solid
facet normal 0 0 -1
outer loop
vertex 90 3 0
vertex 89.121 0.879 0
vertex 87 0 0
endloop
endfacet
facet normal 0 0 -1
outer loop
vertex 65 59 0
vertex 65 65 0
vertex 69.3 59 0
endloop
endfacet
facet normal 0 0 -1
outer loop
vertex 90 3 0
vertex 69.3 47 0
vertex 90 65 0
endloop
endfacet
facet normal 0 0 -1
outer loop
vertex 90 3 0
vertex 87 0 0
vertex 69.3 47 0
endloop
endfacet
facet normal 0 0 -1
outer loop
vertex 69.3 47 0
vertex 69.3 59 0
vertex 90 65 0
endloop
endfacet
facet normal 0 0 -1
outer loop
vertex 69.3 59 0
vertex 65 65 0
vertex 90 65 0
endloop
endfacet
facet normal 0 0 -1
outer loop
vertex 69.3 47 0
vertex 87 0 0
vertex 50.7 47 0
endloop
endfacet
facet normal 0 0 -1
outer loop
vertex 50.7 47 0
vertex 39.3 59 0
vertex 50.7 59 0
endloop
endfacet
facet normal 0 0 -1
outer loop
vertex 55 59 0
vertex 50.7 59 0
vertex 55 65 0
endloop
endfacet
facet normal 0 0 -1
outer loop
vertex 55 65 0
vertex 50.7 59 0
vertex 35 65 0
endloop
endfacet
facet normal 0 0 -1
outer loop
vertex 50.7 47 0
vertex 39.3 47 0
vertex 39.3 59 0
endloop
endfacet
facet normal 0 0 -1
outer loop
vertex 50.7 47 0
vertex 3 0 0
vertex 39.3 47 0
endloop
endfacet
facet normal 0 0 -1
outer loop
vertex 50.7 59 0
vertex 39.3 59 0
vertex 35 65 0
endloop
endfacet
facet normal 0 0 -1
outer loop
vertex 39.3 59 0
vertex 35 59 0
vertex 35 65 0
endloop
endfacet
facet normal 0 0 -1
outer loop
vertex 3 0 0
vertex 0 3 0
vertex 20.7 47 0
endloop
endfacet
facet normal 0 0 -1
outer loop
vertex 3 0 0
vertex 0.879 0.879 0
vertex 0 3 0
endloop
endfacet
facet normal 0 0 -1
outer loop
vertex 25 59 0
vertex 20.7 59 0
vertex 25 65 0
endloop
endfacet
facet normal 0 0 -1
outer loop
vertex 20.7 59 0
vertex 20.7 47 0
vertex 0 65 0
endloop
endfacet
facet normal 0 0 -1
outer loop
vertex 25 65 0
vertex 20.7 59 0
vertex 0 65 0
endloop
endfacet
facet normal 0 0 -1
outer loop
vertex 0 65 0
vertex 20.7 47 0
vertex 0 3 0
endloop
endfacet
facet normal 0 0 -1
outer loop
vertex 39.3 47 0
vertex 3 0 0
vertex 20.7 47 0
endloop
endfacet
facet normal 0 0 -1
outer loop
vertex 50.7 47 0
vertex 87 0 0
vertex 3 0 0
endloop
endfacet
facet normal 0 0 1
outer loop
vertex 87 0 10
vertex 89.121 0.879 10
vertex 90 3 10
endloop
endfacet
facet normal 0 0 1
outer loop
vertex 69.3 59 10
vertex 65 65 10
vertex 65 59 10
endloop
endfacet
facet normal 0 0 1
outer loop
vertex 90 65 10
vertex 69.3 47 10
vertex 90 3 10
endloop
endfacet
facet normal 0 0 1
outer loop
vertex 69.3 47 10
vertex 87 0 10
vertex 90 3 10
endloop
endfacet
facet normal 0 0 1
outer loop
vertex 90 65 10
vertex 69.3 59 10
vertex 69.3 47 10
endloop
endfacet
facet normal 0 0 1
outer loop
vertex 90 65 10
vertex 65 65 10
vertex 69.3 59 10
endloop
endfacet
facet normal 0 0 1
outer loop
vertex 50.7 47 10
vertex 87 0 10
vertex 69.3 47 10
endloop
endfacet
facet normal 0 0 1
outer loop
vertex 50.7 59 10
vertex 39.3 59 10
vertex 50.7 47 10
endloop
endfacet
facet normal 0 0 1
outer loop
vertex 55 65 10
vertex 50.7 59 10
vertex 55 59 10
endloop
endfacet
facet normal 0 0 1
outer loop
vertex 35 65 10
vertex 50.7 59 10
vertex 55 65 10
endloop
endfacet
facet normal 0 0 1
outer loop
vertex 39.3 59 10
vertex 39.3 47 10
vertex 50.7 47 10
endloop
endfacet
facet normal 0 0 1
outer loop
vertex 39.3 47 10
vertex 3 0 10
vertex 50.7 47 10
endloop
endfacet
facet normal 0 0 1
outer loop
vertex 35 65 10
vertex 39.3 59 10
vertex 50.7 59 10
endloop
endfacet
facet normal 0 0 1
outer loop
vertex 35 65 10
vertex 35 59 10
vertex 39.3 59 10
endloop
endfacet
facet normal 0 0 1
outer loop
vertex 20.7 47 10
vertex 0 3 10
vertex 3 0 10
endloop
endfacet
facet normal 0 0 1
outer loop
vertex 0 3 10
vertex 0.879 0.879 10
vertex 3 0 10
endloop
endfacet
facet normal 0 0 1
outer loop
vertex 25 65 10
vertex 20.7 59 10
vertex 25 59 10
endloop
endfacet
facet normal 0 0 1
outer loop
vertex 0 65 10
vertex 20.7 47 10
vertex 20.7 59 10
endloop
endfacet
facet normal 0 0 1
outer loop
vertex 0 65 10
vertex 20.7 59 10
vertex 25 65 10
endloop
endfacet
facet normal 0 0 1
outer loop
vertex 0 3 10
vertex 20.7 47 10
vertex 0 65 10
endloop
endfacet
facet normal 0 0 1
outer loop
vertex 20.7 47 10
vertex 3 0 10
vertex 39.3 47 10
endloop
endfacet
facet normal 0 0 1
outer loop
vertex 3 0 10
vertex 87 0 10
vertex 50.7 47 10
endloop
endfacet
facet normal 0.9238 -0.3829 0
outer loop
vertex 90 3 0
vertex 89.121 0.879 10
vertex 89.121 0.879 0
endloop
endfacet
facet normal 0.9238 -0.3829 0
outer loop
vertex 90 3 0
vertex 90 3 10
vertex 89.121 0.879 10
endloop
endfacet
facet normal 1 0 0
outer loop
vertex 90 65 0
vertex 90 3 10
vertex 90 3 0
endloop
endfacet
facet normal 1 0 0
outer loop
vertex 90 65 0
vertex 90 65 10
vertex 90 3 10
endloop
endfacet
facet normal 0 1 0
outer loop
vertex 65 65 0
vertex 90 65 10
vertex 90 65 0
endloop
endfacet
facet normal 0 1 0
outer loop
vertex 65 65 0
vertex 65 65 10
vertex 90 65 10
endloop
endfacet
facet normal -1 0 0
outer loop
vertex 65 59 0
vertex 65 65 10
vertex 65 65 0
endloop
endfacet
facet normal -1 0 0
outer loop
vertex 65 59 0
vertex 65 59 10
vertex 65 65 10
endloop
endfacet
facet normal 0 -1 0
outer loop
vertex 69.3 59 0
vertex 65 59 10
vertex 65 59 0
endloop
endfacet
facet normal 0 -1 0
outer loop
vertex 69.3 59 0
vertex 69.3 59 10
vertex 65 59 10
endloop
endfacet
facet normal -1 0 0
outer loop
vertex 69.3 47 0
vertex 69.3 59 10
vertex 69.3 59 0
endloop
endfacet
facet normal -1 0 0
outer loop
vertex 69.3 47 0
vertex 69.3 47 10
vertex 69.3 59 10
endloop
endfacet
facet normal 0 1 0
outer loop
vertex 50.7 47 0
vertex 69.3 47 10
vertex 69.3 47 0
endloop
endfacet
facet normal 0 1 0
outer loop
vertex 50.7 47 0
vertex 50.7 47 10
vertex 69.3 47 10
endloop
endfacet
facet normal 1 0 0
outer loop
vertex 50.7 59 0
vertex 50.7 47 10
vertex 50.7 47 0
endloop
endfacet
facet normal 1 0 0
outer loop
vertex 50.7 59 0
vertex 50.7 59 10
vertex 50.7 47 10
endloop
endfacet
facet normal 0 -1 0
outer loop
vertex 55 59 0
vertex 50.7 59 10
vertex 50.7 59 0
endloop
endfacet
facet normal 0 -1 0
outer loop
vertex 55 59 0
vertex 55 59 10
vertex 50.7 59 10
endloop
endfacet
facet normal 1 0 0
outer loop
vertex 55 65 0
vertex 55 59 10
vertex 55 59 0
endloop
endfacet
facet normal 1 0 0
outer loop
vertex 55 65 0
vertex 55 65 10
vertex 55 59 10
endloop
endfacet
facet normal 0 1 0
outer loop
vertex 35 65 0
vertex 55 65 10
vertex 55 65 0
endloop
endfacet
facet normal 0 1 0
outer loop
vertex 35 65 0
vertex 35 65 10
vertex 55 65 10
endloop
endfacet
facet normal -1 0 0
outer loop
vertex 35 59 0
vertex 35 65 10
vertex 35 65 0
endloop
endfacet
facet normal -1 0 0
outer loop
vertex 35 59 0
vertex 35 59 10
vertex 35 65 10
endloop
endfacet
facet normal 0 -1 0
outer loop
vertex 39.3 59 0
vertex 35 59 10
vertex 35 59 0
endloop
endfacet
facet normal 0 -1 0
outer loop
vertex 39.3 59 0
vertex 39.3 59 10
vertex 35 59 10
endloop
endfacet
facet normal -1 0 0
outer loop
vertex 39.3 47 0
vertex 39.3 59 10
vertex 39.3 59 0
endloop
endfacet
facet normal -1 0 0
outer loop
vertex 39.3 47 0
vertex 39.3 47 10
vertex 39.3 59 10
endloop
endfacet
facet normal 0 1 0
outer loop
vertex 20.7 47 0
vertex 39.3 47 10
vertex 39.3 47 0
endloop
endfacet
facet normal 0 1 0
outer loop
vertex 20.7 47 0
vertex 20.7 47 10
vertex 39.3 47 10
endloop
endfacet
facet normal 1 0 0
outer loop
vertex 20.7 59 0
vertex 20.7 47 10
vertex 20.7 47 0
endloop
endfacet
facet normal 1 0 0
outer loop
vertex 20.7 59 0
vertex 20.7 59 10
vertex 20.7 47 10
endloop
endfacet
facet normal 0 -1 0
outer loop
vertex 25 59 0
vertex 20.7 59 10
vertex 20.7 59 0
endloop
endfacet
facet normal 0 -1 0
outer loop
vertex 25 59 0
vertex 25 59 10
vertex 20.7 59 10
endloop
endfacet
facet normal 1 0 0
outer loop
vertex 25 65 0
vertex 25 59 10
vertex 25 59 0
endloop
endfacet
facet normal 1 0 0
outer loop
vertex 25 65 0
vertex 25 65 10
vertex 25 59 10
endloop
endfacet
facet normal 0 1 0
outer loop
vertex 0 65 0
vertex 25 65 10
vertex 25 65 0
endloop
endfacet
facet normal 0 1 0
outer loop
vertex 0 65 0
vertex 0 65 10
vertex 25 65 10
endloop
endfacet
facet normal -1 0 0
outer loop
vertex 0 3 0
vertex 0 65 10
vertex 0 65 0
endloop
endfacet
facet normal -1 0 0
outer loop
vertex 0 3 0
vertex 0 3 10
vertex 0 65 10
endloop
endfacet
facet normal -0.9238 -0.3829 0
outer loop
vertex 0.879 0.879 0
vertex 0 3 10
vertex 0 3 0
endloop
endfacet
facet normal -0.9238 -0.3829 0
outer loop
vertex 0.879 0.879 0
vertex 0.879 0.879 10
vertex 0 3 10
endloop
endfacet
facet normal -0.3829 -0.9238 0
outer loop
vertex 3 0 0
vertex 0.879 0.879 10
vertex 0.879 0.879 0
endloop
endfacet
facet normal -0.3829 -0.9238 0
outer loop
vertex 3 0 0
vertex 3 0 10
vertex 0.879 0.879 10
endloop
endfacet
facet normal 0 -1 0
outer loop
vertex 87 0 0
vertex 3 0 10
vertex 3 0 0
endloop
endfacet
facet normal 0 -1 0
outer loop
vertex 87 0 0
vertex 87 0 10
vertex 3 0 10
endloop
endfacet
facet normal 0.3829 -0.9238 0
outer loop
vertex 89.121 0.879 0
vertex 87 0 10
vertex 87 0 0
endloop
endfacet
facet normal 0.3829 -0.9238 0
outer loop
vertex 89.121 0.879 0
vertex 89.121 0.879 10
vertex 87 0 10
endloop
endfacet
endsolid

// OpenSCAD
$fn = 32;

// ----------------------------------------------------------------------
// Window plate: 90 x 65 mm, 2 open windows
// ----------------------------------------------------------------------

// --- parameters (mm) ---
profile_height = 10;      // extrusion height
profile_points = 24;      // points of the closed outline

profile = [[0, 3], [0.879, 0.879], [3, 0], [87, 0], [89.121, 0.879], [90, 3], [90, 65], [65, 65], [65, 59], [69.3, 59], [69.3, 47], [50.7, 47], [50.7, 59], [55, 59], [55, 65], [35, 65], [35, 59], [39.3, 59], [39.3, 47], [20.7, 47], [20.7, 59], [25, 59], [25, 65], [0, 65]];  // single closed polygon, 24 points, counter clockwise

// --- the one profile operation ---
linear_extrude(height = profile_height) polygon(points = profile);
